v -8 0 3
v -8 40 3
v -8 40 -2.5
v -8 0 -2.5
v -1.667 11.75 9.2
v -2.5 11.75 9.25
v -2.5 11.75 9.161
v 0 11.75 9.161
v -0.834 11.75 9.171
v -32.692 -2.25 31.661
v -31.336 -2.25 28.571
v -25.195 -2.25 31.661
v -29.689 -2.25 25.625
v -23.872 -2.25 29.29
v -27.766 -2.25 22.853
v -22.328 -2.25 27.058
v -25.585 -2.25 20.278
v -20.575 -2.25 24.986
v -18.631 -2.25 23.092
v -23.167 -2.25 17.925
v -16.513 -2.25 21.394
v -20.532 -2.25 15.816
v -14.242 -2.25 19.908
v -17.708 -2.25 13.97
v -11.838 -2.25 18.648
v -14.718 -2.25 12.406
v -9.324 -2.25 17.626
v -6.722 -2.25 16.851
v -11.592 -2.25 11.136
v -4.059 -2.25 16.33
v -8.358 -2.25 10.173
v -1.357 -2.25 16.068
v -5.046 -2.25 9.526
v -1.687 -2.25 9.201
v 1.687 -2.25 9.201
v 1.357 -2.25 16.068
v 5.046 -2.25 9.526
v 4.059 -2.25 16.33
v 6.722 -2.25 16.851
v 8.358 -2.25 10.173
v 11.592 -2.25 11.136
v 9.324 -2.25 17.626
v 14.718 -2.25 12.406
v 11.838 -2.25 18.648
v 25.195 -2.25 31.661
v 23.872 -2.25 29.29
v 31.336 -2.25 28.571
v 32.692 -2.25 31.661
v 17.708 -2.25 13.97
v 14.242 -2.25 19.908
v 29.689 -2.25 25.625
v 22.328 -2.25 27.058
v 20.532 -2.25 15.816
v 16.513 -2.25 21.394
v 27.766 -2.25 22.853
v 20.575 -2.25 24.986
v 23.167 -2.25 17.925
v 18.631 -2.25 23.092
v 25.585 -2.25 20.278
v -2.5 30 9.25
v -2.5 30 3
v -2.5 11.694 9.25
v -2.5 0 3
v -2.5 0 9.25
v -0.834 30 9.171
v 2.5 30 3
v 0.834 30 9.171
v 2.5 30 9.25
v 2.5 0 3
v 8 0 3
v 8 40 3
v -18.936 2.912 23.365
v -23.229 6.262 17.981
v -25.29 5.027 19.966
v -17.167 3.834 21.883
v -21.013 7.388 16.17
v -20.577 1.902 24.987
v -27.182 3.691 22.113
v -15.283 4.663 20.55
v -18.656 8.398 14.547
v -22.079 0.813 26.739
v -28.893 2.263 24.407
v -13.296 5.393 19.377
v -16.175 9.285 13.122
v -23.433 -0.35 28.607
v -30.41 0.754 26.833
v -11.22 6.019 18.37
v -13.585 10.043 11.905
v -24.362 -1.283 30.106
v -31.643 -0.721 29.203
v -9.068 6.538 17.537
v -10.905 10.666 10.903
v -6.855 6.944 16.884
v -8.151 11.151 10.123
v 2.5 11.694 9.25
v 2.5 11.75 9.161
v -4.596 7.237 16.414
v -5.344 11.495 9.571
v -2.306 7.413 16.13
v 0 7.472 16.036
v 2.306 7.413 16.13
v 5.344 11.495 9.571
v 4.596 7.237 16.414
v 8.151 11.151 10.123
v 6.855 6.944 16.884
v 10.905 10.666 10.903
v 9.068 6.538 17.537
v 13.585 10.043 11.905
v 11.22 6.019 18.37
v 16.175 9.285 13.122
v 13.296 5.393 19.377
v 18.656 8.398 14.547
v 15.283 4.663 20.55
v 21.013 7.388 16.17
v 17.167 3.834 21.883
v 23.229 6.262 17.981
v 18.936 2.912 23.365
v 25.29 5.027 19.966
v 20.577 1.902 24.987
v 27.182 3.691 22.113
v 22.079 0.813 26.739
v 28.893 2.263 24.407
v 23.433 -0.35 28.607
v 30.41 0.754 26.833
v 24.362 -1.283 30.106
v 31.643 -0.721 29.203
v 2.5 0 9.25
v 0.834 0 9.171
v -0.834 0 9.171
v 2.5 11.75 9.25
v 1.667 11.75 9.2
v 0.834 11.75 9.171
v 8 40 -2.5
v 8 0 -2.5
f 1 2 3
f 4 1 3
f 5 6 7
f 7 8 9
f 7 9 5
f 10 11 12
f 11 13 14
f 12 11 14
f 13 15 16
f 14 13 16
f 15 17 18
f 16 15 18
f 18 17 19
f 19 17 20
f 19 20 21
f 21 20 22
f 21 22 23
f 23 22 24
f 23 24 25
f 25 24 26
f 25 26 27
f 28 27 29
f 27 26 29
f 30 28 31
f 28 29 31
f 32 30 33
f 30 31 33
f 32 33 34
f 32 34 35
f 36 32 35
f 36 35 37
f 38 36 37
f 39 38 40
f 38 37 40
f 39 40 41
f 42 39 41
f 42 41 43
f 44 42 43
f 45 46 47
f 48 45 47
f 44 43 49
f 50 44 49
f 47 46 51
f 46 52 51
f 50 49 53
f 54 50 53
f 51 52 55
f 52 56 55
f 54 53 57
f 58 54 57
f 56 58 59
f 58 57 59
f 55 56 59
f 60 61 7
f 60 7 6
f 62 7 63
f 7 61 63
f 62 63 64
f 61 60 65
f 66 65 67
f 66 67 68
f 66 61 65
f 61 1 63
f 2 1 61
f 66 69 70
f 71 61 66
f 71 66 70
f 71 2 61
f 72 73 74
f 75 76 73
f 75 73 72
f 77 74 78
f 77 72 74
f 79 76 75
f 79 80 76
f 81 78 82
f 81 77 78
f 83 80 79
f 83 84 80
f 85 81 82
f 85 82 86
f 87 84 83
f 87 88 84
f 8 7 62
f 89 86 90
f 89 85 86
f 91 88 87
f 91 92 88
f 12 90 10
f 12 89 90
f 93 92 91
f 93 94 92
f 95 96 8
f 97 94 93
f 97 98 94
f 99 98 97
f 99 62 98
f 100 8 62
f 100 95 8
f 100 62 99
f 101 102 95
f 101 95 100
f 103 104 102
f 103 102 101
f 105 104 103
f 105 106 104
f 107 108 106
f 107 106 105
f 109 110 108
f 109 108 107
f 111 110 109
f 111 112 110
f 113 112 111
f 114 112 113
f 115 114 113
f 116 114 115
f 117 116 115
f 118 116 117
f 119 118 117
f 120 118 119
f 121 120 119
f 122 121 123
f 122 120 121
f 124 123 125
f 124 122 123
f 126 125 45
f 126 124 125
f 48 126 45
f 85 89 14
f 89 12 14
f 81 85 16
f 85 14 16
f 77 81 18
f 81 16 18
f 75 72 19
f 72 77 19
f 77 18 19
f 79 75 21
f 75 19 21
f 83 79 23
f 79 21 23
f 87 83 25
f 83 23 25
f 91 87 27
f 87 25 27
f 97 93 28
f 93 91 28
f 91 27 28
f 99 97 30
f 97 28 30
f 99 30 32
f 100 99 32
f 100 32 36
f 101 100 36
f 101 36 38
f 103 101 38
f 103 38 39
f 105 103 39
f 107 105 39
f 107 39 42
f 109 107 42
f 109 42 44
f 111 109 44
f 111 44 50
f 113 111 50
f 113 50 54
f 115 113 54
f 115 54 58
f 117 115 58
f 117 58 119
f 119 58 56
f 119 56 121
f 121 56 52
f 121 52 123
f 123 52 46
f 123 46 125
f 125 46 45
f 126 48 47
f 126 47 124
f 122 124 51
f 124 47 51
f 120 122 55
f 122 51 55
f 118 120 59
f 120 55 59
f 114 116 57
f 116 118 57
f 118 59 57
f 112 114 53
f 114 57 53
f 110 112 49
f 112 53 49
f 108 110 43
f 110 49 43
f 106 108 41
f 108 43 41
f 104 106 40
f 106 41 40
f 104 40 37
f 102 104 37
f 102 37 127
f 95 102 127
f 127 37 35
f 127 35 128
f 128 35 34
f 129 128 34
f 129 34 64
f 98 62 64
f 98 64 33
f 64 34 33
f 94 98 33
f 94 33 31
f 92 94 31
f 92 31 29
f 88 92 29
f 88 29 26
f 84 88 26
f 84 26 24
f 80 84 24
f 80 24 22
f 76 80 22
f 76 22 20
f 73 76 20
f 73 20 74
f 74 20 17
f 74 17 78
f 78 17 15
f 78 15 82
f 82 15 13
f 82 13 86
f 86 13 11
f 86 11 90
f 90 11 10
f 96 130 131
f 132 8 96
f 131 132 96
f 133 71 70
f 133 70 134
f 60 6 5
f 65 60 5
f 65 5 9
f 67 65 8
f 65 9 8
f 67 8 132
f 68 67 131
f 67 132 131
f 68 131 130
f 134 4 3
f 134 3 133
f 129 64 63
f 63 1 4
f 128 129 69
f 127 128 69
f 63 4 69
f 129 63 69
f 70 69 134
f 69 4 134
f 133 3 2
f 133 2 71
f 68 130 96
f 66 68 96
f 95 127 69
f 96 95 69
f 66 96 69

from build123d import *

# Parameters (mm, degrees)
SKETCH1_W               = 16
SKETCH1_H               = 5
BOSS_EXTRUDE1_DEPTH     = 30
BOSS_EXTRUDE2_START     = -2.25
BOSS_EXTRUDE2_DEPTH     = 14
CUT_EXTRUDE1_DEPTH      = 33.691742077
CUT_EXTRUDE1_DEPTH_BACK = 33.691742077
BOSS_EXTRUDE3_START     = 30
SKETCH1_3_W             = 16
SKETCH1_3_H             = 5
BOSS_EXTRUDE3_DEPTH     = 10
SKETCH5_W               = 16
SKETCH5_H               = 0.5
BOSS_EXTRUDE4_DEPTH     = 40


with BuildPart() as part:
    # Sketch1 → Boss-Extrude1 (new body)
    with BuildSketch(Plane(origin=(0, 0, 0), x_dir=(1, 0, 0), z_dir=(0, 1, 0))):
        Rectangle(SKETCH1_W, SKETCH1_H)
        with BuildLine():
            Line((2.5, -9.25), (2.5, -2.5))
            Line((2.5, -2.5), (-2.5, -2.5))
            Line((-2.5, -2.5), (-2.5, -9.25))
            ThreePointArc((-2.5, -9.25), (0, -9.160600109), (2.5, -9.25))
        make_face()
    extrude(amount=BOSS_EXTRUDE1_DEPTH)

    # Sketch2 → Boss-Extrude2 (add)
    with BuildSketch(Plane(origin=(0, 0, 0), x_dir=(1, 0, 0), z_dir=(0, 1, 0)).offset(BOSS_EXTRUDE2_START)):
        with BuildLine():
            ThreePointArc((32.691742077, -31.660600109), (0, -9.160600109), (-32.691742077, -31.660600109))
            Line((-32.691742077, -31.660600109), (-25.194555463, -31.660600109))
            ThreePointArc((-25.194555463, -31.660600109), (0, -16.035600109), (25.194555463, -31.660600109))
            Line((25.194555463, -31.660600109), (32.691742077, -31.660600109))
        make_face()
    extrude(amount=BOSS_EXTRUDE2_DEPTH)

    # Sketch3 → Cut-Extrude1 (cut, two sides)
    with BuildSketch(Plane(origin=(0, 0, 0), x_dir=(0, 0, -1), z_dir=(1, 0, 0))) as cut_extrude1_sk:
        Polygon((-31.660600109, -2.25), (-31.660600109, 11.75), (-9.160600109, 11.75), align=None)
    extrude(amount=CUT_EXTRUDE1_DEPTH, mode=Mode.SUBTRACT)
    extrude(cut_extrude1_sk.sketch, amount=-CUT_EXTRUDE1_DEPTH_BACK, mode=Mode.SUBTRACT)

    # Sketch1_3 → Boss-Extrude3 (add)
    with BuildSketch(Plane(origin=(0, 0, 0), x_dir=(1, 0, 0), z_dir=(0, 1, 0)).offset(BOSS_EXTRUDE3_START)):
        Rectangle(SKETCH1_3_W, SKETCH1_3_H)
    extrude(amount=BOSS_EXTRUDE3_DEPTH)

    # Sketch5 → Boss-Extrude4 (add)
    with BuildSketch(Plane(origin=(0, 40, 0), x_dir=(1, 0, 0), z_dir=(0, 1, 0))):
        with Locations((0, -2.75)):
            Rectangle(SKETCH5_W, SKETCH5_H)
    extrude(amount=-BOSS_EXTRUDE4_DEPTH)


solid = part.part
